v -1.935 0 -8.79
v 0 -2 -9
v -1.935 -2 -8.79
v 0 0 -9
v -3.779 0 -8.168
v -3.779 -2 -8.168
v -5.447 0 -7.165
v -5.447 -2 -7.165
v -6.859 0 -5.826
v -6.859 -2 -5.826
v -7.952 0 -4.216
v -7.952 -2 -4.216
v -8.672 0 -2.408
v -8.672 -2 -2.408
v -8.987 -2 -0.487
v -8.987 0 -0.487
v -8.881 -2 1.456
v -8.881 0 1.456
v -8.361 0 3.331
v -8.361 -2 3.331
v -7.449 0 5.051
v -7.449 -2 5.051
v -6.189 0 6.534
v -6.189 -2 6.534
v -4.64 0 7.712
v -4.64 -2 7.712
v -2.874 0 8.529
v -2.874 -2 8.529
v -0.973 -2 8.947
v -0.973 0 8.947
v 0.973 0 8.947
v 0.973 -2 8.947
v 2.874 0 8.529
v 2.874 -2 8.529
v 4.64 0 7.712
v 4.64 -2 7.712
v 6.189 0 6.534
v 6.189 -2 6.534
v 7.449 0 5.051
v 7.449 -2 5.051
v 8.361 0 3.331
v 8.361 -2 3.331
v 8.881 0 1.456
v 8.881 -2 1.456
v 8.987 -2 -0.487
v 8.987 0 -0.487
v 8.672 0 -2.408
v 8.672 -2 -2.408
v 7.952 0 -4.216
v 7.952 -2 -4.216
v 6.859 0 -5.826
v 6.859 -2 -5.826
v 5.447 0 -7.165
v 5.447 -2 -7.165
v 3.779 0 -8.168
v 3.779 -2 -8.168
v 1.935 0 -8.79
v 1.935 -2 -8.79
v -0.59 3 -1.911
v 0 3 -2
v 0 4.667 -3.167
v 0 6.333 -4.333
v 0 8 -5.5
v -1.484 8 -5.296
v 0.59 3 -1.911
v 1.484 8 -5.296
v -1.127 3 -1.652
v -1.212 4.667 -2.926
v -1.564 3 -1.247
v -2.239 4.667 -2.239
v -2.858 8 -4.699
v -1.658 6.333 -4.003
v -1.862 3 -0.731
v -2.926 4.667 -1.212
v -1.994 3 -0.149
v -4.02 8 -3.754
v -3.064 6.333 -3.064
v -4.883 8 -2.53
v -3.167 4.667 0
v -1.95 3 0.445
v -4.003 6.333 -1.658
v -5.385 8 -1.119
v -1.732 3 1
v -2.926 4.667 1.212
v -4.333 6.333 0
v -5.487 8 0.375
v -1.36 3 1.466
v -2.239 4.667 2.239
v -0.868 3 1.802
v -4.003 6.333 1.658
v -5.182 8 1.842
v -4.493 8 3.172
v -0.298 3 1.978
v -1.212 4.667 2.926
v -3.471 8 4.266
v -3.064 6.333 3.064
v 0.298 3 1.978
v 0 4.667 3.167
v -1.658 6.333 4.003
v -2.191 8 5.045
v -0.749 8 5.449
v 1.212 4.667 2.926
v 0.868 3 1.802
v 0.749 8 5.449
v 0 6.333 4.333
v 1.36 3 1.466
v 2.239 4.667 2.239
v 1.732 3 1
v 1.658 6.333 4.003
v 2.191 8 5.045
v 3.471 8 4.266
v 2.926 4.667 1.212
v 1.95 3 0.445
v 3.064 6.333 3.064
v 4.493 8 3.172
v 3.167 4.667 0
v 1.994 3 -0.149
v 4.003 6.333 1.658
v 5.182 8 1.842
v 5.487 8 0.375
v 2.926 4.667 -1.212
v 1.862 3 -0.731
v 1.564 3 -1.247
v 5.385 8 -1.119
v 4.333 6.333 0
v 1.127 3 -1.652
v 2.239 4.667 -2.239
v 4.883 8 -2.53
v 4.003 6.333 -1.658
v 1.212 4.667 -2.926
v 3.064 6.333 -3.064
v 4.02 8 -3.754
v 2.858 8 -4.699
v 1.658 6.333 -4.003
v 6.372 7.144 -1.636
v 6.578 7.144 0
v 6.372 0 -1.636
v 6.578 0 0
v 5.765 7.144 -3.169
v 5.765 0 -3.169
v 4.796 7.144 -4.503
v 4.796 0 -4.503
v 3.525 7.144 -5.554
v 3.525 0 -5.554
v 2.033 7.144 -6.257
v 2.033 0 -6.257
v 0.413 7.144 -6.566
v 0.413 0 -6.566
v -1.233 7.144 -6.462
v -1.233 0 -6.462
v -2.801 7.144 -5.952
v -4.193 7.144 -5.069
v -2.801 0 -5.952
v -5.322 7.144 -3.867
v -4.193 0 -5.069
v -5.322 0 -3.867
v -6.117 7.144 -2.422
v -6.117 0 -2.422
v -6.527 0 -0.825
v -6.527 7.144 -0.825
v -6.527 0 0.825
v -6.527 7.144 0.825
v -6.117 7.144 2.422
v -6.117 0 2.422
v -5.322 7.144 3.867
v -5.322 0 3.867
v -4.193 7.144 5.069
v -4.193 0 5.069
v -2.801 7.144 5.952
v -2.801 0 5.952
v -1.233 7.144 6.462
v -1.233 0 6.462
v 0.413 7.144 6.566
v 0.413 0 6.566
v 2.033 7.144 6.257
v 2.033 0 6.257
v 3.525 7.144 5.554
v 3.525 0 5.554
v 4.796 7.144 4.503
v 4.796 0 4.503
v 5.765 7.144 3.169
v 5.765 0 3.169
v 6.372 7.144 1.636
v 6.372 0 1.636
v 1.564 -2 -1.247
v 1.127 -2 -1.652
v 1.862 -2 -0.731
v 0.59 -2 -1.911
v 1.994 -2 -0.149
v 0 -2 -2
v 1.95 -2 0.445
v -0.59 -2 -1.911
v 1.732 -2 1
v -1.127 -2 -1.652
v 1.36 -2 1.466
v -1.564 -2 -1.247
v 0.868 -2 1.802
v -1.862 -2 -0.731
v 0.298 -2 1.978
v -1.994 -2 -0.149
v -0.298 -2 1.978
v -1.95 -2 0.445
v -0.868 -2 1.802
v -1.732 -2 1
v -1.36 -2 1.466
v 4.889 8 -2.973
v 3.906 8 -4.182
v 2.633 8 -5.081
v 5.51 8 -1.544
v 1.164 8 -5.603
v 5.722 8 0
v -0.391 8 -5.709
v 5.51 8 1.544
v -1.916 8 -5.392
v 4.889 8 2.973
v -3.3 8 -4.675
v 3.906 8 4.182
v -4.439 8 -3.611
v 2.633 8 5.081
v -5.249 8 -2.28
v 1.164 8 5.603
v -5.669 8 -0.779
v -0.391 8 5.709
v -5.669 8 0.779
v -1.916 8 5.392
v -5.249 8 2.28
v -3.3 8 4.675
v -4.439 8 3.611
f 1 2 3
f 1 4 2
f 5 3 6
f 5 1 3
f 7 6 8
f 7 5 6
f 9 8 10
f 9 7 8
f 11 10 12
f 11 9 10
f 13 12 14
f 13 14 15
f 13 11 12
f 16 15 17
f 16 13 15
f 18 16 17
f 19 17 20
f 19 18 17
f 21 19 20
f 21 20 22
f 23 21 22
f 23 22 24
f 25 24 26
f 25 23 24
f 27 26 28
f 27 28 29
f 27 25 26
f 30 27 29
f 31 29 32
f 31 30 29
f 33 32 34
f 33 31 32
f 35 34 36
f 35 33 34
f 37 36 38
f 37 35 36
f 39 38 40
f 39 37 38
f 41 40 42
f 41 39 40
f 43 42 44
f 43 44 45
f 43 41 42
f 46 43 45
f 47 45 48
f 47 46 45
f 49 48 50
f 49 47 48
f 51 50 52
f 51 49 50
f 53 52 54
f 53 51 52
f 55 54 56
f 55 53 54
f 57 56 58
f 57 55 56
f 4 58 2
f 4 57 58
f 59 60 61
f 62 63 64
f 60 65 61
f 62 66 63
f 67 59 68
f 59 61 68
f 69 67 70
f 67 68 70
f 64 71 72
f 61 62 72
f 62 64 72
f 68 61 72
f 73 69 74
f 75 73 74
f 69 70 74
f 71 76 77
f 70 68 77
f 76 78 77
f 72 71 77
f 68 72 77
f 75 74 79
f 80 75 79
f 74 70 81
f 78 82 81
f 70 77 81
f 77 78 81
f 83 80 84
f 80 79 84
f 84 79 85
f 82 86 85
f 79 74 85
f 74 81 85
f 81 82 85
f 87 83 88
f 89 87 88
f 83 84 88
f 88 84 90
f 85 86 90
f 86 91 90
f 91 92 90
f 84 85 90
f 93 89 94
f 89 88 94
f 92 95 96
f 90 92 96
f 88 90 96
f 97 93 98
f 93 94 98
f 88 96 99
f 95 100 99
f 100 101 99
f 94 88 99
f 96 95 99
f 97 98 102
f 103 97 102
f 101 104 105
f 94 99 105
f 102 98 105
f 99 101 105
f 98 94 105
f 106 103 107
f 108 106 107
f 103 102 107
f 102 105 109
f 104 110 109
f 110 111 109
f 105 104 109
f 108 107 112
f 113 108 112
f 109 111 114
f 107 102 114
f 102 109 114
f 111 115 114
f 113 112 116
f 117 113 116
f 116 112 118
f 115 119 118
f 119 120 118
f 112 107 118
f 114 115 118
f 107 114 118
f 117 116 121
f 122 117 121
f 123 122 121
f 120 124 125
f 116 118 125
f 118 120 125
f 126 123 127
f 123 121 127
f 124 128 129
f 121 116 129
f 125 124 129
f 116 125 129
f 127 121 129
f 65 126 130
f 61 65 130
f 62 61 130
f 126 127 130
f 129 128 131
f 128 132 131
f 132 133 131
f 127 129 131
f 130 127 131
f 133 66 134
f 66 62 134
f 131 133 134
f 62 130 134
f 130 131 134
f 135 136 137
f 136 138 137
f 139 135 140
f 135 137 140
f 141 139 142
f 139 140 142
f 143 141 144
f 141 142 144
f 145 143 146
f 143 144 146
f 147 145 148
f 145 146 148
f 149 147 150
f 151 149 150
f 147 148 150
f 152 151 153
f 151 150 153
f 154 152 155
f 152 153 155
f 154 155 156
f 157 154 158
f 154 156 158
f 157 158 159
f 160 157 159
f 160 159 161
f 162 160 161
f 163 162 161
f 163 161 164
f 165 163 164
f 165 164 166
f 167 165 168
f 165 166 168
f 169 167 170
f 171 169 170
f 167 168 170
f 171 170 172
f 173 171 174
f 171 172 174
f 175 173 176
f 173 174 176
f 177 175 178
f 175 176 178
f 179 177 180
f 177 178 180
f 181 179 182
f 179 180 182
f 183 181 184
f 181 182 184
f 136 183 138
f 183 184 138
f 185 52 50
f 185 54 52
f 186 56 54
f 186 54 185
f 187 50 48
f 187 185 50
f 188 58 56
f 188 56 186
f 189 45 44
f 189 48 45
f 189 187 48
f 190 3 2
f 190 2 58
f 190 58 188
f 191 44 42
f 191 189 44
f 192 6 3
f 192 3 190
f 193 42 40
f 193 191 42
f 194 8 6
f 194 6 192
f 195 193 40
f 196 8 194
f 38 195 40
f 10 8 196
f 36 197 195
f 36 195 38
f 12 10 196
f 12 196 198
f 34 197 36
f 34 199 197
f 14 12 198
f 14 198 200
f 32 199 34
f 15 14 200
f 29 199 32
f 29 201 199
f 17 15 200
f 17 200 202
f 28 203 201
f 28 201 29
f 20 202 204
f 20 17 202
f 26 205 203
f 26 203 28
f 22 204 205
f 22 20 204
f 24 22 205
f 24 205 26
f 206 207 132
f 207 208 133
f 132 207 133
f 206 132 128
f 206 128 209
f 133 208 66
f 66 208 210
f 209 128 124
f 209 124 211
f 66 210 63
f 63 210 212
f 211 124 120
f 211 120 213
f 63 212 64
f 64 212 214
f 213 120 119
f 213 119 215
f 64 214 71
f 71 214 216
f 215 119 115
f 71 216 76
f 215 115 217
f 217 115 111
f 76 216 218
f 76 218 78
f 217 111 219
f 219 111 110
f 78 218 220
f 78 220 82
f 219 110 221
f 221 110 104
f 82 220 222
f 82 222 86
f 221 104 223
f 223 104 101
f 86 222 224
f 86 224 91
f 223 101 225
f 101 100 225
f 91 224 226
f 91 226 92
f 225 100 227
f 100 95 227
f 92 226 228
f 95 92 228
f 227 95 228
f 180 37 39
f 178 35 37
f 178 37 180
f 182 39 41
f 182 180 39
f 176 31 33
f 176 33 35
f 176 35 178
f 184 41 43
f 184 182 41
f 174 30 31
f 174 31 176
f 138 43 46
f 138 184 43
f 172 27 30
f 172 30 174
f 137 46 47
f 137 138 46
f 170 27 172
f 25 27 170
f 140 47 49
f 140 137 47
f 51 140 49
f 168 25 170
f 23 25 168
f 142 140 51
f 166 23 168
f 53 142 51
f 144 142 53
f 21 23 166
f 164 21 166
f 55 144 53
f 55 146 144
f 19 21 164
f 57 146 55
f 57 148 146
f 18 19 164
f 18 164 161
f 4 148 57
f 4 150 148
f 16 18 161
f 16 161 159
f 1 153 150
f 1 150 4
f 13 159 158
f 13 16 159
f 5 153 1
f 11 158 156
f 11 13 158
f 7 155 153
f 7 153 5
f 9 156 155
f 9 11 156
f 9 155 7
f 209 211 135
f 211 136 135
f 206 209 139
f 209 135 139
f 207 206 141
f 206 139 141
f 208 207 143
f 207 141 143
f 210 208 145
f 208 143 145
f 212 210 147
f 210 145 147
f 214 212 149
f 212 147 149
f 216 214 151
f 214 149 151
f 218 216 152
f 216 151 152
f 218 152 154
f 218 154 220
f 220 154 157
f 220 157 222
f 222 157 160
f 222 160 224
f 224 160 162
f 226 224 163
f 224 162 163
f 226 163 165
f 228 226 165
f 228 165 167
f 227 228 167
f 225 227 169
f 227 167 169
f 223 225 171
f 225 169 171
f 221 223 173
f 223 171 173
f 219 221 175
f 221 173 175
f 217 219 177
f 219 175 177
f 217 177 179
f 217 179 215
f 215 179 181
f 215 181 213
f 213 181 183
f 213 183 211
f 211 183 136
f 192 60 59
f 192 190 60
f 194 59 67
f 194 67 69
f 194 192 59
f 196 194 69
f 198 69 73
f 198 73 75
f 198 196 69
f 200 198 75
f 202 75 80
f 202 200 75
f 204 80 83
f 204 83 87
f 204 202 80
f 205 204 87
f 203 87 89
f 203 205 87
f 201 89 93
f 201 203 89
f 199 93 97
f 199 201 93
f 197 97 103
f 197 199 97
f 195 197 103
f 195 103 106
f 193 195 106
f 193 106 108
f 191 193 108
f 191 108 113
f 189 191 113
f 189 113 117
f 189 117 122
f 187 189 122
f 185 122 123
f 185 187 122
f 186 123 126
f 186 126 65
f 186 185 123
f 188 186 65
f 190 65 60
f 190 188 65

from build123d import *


# Read off the part's stored shape, not the designer's step: G1/4 Straight Pipe Tapped Thread Stud1
with BuildPart() as part:
    # Sketch1 → Revolve1 (revolve)
    with BuildSketch(Plane.XY, mode=Mode.PRIVATE) as revolve1_sk:
        Polygon((7, 0), (2, 0), (2, 3), (5.5, 8), (7, 8), align=None)
        Polygon((7, 0), (2, 0), (2, -2), (9, -2), (9, 0), align=None)
    revolve(revolve1_sk.sketch.rotate(Axis((0, 0, 0), (0, 1, 0)), 90), axis=Axis((0, 0, 0), (0, 1, 0)))

    # G1/4 Straight Pipe Tapped Thread Stud1 o → G1/4 Straight Pipe Tapped Thread Stud1 (revolve, cut)
    with BuildSketch(Plane.XY):
        Polygon((7, 8), (5.7225, 8), (6.5785, 7.144), (6.5785, 0), (7, 0), align=None)
    revolve(axis=Axis((0, 0, 0), (0, 1, 0)), mode=Mode.SUBTRACT)


solid = part.part
